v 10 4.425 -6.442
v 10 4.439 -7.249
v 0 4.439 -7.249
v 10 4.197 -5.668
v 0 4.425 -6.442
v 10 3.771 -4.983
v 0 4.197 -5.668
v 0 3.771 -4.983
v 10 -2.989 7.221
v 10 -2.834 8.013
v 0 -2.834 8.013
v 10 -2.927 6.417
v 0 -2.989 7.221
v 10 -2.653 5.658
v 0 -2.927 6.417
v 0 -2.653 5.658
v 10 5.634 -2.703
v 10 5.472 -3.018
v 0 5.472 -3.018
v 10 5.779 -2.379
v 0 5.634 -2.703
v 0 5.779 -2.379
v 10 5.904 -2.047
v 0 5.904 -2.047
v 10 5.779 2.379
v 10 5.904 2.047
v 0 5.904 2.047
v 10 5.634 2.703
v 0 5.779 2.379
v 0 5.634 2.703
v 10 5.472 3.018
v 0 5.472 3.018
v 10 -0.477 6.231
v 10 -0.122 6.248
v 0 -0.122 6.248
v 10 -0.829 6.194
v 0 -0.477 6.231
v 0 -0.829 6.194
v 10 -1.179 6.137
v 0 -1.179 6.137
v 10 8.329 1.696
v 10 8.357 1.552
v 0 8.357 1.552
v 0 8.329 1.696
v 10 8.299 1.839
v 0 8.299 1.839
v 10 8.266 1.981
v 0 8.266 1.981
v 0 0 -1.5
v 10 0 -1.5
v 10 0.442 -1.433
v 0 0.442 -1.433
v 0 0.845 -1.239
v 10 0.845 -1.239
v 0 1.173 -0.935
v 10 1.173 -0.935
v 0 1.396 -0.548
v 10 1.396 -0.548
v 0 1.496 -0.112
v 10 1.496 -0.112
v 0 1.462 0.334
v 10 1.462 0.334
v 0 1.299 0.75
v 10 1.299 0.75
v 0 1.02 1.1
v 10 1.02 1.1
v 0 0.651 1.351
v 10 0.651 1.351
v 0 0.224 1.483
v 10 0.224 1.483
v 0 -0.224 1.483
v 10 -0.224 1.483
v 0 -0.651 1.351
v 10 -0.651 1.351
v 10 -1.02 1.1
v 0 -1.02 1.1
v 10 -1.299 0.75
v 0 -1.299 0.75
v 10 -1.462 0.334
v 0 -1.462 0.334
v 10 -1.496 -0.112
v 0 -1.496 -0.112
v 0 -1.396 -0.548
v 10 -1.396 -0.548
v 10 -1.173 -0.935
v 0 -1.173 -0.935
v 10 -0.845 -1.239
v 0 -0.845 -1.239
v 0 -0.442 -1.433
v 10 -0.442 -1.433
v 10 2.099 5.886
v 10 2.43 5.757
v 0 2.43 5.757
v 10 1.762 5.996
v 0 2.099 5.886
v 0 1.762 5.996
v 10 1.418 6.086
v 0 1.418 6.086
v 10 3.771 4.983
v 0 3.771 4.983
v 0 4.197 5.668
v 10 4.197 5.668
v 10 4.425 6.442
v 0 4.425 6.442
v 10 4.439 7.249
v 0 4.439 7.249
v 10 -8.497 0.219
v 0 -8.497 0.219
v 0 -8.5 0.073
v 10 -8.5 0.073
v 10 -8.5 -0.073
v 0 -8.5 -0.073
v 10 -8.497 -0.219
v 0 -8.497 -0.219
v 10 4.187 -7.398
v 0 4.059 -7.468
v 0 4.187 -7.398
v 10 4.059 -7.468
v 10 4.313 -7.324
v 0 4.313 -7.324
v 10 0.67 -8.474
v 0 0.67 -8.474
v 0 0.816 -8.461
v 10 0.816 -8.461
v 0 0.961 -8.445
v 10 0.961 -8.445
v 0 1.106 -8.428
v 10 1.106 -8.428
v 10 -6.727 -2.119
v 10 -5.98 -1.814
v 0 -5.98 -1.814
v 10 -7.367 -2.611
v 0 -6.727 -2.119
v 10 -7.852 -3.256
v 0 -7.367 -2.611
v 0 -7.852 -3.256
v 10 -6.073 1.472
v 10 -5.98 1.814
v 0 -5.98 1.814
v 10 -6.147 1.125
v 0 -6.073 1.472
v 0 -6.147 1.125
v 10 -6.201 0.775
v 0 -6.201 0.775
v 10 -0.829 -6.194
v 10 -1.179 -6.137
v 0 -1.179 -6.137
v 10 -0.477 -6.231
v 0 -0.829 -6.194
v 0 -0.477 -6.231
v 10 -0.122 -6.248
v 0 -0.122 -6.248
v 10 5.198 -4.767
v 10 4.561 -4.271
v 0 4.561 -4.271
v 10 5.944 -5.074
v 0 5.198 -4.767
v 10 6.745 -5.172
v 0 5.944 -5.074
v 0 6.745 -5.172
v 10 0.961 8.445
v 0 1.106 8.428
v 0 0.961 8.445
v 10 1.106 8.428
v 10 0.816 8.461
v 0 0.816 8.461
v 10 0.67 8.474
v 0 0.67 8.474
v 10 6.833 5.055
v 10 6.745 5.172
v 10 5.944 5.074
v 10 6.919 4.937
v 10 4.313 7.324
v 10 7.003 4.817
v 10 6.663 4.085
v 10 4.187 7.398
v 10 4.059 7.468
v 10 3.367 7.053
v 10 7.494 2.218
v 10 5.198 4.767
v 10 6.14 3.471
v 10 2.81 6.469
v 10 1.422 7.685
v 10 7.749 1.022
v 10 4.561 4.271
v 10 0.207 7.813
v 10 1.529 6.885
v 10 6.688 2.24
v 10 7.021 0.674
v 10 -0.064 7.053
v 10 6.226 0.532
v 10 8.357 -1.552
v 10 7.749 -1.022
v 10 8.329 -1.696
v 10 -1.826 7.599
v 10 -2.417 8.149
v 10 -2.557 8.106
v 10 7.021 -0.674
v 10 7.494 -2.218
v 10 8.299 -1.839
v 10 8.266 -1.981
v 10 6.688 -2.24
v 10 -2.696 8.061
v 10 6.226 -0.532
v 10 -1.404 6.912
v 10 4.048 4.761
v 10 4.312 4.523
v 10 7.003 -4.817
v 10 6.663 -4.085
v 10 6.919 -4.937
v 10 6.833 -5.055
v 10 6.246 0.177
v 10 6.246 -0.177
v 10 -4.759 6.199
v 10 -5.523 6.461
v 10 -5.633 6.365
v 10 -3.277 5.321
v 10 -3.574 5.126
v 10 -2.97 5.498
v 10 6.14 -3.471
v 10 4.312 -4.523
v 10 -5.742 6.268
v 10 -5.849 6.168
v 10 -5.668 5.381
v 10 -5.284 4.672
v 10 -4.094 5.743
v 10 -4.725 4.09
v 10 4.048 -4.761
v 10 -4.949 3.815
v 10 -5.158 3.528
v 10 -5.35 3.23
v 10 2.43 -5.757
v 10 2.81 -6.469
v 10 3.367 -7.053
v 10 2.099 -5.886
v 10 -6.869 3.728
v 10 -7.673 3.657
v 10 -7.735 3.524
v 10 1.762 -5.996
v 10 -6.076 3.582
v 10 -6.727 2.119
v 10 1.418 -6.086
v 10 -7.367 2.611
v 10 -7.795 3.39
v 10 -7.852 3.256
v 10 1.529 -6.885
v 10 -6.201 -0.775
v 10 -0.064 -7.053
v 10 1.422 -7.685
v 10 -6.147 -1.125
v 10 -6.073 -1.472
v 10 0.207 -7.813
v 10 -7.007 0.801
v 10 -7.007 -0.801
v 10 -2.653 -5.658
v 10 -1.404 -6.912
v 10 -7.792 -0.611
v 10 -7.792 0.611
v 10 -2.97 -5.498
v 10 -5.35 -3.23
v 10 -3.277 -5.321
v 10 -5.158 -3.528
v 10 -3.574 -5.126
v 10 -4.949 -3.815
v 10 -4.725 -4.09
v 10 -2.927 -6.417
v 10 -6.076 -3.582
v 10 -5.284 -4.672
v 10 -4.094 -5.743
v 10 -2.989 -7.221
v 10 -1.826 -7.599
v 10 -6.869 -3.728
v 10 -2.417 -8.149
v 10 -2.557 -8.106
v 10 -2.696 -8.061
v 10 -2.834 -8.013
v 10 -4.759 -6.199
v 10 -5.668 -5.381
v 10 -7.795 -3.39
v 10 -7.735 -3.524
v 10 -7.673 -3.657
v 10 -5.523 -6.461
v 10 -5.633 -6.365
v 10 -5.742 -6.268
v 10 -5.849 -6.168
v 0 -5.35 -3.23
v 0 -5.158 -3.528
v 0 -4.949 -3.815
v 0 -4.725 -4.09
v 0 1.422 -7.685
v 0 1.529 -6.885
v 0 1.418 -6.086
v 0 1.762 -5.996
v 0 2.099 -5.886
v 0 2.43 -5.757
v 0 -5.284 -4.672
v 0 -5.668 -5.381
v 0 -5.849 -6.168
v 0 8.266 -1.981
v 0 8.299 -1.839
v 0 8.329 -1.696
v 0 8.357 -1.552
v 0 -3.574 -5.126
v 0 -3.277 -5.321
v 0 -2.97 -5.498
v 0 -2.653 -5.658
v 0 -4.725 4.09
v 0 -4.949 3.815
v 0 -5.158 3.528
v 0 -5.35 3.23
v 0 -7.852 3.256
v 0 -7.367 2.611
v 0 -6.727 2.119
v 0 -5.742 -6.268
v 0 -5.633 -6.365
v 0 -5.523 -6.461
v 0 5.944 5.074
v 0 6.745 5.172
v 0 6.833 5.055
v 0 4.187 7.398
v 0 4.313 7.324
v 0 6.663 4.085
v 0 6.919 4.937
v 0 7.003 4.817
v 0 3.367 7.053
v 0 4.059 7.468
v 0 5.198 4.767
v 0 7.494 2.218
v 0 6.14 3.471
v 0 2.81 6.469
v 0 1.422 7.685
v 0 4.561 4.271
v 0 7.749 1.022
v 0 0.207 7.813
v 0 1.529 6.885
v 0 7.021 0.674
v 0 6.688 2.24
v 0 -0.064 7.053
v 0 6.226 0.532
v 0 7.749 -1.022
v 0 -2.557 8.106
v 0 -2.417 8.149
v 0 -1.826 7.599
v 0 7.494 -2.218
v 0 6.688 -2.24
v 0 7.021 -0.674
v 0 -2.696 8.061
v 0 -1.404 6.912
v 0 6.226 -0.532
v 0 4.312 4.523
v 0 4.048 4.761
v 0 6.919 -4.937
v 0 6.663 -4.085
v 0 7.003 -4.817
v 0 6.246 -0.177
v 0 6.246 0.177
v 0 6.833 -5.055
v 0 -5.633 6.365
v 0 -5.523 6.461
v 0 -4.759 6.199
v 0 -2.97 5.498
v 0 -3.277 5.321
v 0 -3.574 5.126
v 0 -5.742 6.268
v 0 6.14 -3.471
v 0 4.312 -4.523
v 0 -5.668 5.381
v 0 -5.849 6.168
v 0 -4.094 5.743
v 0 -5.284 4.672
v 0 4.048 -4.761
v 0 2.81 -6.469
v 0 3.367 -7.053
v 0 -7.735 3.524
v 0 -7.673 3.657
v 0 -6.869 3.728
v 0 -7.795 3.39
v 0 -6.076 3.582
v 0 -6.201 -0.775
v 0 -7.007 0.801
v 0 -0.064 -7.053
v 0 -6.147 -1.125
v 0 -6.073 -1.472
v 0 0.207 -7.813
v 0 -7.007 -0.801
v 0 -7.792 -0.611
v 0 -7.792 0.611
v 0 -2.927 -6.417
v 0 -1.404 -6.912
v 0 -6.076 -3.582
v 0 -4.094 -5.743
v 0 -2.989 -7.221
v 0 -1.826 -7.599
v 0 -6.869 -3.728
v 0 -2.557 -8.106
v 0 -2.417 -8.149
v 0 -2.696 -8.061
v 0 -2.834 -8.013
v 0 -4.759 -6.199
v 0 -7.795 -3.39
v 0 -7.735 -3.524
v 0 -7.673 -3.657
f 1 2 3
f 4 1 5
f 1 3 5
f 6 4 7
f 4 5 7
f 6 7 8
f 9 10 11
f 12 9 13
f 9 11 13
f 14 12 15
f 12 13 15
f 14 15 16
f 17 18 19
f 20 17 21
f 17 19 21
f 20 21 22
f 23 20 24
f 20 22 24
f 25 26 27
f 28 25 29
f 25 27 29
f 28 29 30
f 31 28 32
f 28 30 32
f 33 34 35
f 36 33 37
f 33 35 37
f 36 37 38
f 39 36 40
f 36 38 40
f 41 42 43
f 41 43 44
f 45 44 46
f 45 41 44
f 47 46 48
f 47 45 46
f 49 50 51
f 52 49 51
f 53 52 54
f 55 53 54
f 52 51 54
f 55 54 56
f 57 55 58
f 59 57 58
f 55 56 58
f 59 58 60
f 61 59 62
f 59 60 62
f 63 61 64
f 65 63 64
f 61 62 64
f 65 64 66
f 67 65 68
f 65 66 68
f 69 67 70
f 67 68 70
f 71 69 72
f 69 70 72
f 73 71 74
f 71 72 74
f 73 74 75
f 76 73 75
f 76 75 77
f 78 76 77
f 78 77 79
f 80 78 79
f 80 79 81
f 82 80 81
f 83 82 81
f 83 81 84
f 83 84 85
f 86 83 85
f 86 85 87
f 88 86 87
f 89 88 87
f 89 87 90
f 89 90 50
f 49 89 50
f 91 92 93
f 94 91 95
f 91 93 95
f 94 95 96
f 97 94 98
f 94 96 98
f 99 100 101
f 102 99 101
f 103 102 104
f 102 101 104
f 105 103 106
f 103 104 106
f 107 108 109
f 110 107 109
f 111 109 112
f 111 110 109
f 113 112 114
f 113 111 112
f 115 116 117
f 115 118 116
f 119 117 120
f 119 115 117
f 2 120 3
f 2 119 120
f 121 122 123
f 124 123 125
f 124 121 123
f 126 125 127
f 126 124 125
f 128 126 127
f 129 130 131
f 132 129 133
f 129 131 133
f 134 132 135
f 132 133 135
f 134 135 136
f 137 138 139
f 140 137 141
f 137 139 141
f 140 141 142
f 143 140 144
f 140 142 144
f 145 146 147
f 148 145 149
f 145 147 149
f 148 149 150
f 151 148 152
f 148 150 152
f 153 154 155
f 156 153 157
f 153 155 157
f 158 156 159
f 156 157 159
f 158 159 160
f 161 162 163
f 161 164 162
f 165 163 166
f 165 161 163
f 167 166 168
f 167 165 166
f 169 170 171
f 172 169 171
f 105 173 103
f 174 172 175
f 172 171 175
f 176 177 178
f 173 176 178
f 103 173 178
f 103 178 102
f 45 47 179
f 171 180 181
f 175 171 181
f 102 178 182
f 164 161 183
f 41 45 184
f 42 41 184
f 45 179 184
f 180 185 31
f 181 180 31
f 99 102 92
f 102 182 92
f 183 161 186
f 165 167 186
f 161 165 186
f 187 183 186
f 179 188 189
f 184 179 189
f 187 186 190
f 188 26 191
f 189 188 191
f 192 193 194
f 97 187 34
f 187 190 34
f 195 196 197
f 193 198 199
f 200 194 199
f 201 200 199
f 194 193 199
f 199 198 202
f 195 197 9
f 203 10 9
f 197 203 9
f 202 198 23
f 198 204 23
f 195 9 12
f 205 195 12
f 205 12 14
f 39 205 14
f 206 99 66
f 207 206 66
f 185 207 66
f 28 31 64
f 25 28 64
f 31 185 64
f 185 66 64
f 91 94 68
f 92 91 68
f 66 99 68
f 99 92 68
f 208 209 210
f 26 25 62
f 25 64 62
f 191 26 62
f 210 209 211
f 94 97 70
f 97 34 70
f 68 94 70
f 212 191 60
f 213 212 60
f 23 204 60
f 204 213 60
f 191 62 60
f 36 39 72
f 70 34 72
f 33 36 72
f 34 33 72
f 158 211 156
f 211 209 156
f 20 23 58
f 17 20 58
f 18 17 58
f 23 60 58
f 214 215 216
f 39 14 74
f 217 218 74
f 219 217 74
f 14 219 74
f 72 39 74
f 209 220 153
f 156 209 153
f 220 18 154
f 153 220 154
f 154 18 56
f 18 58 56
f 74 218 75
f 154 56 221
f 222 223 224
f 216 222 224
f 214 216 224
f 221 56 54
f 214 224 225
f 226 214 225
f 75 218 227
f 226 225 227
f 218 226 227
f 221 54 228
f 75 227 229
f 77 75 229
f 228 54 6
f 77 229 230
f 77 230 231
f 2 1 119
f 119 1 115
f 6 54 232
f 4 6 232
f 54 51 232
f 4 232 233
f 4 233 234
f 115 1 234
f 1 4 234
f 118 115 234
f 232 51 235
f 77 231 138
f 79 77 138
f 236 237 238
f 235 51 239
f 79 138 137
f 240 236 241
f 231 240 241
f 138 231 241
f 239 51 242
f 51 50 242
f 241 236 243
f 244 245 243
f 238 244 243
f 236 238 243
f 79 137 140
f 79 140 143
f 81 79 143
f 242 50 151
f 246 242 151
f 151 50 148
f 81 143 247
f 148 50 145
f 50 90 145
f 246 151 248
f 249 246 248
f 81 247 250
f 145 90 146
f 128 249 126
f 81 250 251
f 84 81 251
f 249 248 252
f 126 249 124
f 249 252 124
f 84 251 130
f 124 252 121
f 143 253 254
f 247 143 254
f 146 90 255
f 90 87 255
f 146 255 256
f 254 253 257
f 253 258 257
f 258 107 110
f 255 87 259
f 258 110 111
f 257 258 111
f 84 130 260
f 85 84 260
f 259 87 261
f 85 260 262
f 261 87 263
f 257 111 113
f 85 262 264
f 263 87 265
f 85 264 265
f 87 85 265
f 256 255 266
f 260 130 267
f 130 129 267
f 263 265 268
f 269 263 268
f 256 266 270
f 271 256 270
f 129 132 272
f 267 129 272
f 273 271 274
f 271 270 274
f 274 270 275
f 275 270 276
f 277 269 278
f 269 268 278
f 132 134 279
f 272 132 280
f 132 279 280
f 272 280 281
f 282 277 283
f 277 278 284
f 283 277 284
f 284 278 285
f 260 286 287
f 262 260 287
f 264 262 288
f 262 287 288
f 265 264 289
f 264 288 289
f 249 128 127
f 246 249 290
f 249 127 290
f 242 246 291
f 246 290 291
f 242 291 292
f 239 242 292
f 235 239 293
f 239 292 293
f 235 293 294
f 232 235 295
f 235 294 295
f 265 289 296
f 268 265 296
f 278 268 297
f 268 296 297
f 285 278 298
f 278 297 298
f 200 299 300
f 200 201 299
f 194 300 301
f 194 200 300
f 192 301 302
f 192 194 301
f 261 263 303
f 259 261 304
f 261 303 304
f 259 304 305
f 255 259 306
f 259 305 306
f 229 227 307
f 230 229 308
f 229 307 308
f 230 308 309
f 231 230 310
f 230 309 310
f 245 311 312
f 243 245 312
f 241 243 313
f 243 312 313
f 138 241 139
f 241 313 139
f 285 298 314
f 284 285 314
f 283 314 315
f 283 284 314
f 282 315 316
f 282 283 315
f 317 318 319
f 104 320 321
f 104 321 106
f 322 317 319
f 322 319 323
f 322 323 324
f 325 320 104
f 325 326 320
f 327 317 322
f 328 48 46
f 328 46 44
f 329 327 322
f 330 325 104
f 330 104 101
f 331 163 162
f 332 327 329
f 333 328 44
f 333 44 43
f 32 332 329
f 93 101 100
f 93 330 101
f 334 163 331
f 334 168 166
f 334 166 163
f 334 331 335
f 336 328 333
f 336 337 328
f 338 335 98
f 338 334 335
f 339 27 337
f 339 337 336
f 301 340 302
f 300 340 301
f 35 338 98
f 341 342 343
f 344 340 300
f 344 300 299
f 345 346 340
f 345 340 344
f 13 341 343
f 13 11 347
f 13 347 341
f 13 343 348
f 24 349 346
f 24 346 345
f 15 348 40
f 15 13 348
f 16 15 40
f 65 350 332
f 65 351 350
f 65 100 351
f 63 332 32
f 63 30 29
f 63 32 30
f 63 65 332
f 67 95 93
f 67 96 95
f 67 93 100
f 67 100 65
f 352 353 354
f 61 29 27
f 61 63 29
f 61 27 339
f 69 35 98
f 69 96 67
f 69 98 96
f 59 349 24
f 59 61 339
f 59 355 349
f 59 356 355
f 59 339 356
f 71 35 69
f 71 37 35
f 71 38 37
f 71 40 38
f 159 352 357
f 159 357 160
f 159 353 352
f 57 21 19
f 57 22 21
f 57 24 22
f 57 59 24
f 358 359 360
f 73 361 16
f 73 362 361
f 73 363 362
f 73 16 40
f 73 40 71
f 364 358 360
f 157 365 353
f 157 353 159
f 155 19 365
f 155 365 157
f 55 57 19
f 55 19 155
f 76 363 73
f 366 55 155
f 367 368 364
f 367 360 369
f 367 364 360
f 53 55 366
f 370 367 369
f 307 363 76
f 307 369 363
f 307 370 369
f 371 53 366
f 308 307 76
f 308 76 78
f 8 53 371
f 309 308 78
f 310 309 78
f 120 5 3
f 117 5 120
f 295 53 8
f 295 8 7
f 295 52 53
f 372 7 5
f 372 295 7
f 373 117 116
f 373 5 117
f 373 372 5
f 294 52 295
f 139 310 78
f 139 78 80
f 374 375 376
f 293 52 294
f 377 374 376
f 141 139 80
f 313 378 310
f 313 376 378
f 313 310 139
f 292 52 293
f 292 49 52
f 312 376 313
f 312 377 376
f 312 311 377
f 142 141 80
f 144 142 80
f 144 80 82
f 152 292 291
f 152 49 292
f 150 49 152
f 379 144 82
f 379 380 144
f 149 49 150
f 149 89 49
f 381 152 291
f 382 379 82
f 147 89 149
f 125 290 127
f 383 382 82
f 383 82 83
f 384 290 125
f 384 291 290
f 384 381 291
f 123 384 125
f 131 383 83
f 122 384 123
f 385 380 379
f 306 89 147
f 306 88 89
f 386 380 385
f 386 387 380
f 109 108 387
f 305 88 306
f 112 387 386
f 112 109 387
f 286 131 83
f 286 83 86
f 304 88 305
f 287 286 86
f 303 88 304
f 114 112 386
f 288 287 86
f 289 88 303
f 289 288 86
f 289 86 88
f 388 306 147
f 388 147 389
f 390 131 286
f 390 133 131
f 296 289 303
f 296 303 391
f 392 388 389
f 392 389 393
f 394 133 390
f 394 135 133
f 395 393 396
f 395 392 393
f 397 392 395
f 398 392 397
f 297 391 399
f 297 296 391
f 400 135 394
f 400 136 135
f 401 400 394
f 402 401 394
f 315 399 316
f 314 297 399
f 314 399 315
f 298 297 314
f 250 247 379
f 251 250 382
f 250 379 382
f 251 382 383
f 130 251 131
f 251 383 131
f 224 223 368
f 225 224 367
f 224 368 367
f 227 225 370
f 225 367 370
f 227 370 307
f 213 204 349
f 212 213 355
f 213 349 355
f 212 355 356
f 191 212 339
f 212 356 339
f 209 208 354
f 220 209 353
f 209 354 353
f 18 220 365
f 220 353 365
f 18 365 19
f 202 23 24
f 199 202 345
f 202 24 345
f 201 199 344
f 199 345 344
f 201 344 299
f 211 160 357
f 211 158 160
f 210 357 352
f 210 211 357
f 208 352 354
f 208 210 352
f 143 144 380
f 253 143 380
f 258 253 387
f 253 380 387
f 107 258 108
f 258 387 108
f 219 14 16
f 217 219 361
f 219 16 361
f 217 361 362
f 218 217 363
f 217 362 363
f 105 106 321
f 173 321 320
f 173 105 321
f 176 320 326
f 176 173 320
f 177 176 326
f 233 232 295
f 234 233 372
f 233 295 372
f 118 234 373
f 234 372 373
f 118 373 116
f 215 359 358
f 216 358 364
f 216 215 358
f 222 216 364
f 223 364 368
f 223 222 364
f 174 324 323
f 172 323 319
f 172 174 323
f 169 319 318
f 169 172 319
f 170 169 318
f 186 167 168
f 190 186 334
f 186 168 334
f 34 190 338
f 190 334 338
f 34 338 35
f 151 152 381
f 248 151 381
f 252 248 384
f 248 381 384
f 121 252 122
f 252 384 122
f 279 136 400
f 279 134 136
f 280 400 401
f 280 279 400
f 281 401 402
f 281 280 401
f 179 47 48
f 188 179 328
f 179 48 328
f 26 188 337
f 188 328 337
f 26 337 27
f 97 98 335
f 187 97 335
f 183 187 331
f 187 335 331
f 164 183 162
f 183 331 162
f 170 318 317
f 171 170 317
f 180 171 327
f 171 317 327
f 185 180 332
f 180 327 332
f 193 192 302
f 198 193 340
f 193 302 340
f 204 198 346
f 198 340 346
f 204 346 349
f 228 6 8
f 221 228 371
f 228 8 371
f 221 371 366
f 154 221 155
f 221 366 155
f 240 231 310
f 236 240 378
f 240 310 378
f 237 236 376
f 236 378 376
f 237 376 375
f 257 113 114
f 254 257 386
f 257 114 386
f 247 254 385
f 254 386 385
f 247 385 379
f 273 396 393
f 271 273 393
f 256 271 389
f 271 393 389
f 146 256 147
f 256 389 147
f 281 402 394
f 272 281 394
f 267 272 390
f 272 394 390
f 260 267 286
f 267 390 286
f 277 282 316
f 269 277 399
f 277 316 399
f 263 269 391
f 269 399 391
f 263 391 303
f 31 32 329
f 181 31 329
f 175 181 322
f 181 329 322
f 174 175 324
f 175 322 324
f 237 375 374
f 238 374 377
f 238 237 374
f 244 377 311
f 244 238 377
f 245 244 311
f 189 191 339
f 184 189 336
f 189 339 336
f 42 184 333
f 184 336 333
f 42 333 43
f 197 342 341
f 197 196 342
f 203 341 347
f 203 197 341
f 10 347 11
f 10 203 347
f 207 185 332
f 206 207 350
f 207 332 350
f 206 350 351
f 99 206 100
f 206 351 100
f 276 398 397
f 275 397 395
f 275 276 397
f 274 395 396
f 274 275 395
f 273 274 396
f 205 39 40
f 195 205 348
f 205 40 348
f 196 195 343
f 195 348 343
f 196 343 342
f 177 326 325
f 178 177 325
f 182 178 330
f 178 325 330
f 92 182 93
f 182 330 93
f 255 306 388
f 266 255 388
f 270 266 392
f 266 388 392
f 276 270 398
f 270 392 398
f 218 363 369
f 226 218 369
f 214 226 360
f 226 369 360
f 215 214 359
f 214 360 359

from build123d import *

# Parameters (mm, degrees)
BASPROSKE_W        = 10
BASPROSKE_H        = 8.5
TOOTHCUT_DEPTH     = 16.636495771
TEETHCUTS_COUNT    = 15
TEETHCUTS_ANGLE    = 336
BORSKE_R           = 0.4
BORE_DEPTH         = 50.0000508
CUT_EXTRUDE1_REACH = 17.622
SKETCH1_R          = 1.5


with BuildPart() as part:
    # BasProSke → Base-Revolve (revolve)
    with BuildSketch(Plane(origin=(0, 0, 0), x_dir=(1, 0, 0), z_dir=(0, 1, 0)), mode=Mode.PRIVATE) as base_revolve_sk:
        with Locations((5, 4.25)):
            Rectangle(BASPROSKE_W, BASPROSKE_H)
    revolve(base_revolve_sk.sketch.rotate(Axis((-10, 0, 0), (1, 0, 0)), 180), axis=Axis((-10, 0, 0), (1, 0, 0)))

    # TooCutSke → ToothCut (cut, through all)
    with BuildSketch(Plane(origin=(0, 0, 0), x_dir=(0, 0, -1), z_dir=(1, 0, 0))):
        with BuildLine():
            ThreePointArc((0.531576138, 6.226349477), (0, 6.249), (-0.531576138, 6.226349477))
            ThreePointArc((-0.531576138, 6.226349477), (-0.830301624, 7.411024729), (-1.576608494, 8.378350125))
            ThreePointArc((-1.576608494, 8.378350125), (0, 8.5254), (1.576608494, 8.378350125))
            ThreePointArc((1.576608494, 8.378350125), (0.830301624, 7.411024729), (0.531576138, 6.226349477))
        make_face()
    toothcut = extrude(amount=TOOTHCUT_DEPTH, mode=Mode.SUBTRACT)

    # TeethCuts: ToothCut ×15 about axis
    teethcuts_axis = Axis((-10, 0, 0), (1, 0, 0))
    for i in range(1, TEETHCUTS_COUNT):
        add(toothcut.rotate(teethcuts_axis, i * TEETHCUTS_ANGLE / (TEETHCUTS_COUNT - 1)), mode=Mode.SUBTRACT)

    # BorSke → Bore (cut, symmetric)
    with BuildSketch(Plane(origin=(0, 0, 0), x_dir=(0, 0, -1), z_dir=(1, 0, 0))):
        with Locations(Location((0, 0, 0), (0, 0, 180))):
            Circle(BORSKE_R)
    extrude(amount=BORE_DEPTH, both=True, mode=Mode.SUBTRACT)

    # Sketch1 → Cut-Extrude1 (cut, up to next)
    with BuildSketch(Plane(origin=(10, 0, 0), x_dir=(0, 0, -1), z_dir=(1, 0, 0)), mode=Mode.PRIVATE) as cut_extrude1_sk1:
        Circle(SKETCH1_R)
    cut_extrude1_tool1 = extrude(cut_extrude1_sk1.sketch, amount=-CUT_EXTRUDE1_REACH, mode=Mode.PRIVATE) & part.part
    add(cut_extrude1_tool1.solids().sort_by_distance((10, 0, 0))[0], mode=Mode.SUBTRACT)


solid = part.part
